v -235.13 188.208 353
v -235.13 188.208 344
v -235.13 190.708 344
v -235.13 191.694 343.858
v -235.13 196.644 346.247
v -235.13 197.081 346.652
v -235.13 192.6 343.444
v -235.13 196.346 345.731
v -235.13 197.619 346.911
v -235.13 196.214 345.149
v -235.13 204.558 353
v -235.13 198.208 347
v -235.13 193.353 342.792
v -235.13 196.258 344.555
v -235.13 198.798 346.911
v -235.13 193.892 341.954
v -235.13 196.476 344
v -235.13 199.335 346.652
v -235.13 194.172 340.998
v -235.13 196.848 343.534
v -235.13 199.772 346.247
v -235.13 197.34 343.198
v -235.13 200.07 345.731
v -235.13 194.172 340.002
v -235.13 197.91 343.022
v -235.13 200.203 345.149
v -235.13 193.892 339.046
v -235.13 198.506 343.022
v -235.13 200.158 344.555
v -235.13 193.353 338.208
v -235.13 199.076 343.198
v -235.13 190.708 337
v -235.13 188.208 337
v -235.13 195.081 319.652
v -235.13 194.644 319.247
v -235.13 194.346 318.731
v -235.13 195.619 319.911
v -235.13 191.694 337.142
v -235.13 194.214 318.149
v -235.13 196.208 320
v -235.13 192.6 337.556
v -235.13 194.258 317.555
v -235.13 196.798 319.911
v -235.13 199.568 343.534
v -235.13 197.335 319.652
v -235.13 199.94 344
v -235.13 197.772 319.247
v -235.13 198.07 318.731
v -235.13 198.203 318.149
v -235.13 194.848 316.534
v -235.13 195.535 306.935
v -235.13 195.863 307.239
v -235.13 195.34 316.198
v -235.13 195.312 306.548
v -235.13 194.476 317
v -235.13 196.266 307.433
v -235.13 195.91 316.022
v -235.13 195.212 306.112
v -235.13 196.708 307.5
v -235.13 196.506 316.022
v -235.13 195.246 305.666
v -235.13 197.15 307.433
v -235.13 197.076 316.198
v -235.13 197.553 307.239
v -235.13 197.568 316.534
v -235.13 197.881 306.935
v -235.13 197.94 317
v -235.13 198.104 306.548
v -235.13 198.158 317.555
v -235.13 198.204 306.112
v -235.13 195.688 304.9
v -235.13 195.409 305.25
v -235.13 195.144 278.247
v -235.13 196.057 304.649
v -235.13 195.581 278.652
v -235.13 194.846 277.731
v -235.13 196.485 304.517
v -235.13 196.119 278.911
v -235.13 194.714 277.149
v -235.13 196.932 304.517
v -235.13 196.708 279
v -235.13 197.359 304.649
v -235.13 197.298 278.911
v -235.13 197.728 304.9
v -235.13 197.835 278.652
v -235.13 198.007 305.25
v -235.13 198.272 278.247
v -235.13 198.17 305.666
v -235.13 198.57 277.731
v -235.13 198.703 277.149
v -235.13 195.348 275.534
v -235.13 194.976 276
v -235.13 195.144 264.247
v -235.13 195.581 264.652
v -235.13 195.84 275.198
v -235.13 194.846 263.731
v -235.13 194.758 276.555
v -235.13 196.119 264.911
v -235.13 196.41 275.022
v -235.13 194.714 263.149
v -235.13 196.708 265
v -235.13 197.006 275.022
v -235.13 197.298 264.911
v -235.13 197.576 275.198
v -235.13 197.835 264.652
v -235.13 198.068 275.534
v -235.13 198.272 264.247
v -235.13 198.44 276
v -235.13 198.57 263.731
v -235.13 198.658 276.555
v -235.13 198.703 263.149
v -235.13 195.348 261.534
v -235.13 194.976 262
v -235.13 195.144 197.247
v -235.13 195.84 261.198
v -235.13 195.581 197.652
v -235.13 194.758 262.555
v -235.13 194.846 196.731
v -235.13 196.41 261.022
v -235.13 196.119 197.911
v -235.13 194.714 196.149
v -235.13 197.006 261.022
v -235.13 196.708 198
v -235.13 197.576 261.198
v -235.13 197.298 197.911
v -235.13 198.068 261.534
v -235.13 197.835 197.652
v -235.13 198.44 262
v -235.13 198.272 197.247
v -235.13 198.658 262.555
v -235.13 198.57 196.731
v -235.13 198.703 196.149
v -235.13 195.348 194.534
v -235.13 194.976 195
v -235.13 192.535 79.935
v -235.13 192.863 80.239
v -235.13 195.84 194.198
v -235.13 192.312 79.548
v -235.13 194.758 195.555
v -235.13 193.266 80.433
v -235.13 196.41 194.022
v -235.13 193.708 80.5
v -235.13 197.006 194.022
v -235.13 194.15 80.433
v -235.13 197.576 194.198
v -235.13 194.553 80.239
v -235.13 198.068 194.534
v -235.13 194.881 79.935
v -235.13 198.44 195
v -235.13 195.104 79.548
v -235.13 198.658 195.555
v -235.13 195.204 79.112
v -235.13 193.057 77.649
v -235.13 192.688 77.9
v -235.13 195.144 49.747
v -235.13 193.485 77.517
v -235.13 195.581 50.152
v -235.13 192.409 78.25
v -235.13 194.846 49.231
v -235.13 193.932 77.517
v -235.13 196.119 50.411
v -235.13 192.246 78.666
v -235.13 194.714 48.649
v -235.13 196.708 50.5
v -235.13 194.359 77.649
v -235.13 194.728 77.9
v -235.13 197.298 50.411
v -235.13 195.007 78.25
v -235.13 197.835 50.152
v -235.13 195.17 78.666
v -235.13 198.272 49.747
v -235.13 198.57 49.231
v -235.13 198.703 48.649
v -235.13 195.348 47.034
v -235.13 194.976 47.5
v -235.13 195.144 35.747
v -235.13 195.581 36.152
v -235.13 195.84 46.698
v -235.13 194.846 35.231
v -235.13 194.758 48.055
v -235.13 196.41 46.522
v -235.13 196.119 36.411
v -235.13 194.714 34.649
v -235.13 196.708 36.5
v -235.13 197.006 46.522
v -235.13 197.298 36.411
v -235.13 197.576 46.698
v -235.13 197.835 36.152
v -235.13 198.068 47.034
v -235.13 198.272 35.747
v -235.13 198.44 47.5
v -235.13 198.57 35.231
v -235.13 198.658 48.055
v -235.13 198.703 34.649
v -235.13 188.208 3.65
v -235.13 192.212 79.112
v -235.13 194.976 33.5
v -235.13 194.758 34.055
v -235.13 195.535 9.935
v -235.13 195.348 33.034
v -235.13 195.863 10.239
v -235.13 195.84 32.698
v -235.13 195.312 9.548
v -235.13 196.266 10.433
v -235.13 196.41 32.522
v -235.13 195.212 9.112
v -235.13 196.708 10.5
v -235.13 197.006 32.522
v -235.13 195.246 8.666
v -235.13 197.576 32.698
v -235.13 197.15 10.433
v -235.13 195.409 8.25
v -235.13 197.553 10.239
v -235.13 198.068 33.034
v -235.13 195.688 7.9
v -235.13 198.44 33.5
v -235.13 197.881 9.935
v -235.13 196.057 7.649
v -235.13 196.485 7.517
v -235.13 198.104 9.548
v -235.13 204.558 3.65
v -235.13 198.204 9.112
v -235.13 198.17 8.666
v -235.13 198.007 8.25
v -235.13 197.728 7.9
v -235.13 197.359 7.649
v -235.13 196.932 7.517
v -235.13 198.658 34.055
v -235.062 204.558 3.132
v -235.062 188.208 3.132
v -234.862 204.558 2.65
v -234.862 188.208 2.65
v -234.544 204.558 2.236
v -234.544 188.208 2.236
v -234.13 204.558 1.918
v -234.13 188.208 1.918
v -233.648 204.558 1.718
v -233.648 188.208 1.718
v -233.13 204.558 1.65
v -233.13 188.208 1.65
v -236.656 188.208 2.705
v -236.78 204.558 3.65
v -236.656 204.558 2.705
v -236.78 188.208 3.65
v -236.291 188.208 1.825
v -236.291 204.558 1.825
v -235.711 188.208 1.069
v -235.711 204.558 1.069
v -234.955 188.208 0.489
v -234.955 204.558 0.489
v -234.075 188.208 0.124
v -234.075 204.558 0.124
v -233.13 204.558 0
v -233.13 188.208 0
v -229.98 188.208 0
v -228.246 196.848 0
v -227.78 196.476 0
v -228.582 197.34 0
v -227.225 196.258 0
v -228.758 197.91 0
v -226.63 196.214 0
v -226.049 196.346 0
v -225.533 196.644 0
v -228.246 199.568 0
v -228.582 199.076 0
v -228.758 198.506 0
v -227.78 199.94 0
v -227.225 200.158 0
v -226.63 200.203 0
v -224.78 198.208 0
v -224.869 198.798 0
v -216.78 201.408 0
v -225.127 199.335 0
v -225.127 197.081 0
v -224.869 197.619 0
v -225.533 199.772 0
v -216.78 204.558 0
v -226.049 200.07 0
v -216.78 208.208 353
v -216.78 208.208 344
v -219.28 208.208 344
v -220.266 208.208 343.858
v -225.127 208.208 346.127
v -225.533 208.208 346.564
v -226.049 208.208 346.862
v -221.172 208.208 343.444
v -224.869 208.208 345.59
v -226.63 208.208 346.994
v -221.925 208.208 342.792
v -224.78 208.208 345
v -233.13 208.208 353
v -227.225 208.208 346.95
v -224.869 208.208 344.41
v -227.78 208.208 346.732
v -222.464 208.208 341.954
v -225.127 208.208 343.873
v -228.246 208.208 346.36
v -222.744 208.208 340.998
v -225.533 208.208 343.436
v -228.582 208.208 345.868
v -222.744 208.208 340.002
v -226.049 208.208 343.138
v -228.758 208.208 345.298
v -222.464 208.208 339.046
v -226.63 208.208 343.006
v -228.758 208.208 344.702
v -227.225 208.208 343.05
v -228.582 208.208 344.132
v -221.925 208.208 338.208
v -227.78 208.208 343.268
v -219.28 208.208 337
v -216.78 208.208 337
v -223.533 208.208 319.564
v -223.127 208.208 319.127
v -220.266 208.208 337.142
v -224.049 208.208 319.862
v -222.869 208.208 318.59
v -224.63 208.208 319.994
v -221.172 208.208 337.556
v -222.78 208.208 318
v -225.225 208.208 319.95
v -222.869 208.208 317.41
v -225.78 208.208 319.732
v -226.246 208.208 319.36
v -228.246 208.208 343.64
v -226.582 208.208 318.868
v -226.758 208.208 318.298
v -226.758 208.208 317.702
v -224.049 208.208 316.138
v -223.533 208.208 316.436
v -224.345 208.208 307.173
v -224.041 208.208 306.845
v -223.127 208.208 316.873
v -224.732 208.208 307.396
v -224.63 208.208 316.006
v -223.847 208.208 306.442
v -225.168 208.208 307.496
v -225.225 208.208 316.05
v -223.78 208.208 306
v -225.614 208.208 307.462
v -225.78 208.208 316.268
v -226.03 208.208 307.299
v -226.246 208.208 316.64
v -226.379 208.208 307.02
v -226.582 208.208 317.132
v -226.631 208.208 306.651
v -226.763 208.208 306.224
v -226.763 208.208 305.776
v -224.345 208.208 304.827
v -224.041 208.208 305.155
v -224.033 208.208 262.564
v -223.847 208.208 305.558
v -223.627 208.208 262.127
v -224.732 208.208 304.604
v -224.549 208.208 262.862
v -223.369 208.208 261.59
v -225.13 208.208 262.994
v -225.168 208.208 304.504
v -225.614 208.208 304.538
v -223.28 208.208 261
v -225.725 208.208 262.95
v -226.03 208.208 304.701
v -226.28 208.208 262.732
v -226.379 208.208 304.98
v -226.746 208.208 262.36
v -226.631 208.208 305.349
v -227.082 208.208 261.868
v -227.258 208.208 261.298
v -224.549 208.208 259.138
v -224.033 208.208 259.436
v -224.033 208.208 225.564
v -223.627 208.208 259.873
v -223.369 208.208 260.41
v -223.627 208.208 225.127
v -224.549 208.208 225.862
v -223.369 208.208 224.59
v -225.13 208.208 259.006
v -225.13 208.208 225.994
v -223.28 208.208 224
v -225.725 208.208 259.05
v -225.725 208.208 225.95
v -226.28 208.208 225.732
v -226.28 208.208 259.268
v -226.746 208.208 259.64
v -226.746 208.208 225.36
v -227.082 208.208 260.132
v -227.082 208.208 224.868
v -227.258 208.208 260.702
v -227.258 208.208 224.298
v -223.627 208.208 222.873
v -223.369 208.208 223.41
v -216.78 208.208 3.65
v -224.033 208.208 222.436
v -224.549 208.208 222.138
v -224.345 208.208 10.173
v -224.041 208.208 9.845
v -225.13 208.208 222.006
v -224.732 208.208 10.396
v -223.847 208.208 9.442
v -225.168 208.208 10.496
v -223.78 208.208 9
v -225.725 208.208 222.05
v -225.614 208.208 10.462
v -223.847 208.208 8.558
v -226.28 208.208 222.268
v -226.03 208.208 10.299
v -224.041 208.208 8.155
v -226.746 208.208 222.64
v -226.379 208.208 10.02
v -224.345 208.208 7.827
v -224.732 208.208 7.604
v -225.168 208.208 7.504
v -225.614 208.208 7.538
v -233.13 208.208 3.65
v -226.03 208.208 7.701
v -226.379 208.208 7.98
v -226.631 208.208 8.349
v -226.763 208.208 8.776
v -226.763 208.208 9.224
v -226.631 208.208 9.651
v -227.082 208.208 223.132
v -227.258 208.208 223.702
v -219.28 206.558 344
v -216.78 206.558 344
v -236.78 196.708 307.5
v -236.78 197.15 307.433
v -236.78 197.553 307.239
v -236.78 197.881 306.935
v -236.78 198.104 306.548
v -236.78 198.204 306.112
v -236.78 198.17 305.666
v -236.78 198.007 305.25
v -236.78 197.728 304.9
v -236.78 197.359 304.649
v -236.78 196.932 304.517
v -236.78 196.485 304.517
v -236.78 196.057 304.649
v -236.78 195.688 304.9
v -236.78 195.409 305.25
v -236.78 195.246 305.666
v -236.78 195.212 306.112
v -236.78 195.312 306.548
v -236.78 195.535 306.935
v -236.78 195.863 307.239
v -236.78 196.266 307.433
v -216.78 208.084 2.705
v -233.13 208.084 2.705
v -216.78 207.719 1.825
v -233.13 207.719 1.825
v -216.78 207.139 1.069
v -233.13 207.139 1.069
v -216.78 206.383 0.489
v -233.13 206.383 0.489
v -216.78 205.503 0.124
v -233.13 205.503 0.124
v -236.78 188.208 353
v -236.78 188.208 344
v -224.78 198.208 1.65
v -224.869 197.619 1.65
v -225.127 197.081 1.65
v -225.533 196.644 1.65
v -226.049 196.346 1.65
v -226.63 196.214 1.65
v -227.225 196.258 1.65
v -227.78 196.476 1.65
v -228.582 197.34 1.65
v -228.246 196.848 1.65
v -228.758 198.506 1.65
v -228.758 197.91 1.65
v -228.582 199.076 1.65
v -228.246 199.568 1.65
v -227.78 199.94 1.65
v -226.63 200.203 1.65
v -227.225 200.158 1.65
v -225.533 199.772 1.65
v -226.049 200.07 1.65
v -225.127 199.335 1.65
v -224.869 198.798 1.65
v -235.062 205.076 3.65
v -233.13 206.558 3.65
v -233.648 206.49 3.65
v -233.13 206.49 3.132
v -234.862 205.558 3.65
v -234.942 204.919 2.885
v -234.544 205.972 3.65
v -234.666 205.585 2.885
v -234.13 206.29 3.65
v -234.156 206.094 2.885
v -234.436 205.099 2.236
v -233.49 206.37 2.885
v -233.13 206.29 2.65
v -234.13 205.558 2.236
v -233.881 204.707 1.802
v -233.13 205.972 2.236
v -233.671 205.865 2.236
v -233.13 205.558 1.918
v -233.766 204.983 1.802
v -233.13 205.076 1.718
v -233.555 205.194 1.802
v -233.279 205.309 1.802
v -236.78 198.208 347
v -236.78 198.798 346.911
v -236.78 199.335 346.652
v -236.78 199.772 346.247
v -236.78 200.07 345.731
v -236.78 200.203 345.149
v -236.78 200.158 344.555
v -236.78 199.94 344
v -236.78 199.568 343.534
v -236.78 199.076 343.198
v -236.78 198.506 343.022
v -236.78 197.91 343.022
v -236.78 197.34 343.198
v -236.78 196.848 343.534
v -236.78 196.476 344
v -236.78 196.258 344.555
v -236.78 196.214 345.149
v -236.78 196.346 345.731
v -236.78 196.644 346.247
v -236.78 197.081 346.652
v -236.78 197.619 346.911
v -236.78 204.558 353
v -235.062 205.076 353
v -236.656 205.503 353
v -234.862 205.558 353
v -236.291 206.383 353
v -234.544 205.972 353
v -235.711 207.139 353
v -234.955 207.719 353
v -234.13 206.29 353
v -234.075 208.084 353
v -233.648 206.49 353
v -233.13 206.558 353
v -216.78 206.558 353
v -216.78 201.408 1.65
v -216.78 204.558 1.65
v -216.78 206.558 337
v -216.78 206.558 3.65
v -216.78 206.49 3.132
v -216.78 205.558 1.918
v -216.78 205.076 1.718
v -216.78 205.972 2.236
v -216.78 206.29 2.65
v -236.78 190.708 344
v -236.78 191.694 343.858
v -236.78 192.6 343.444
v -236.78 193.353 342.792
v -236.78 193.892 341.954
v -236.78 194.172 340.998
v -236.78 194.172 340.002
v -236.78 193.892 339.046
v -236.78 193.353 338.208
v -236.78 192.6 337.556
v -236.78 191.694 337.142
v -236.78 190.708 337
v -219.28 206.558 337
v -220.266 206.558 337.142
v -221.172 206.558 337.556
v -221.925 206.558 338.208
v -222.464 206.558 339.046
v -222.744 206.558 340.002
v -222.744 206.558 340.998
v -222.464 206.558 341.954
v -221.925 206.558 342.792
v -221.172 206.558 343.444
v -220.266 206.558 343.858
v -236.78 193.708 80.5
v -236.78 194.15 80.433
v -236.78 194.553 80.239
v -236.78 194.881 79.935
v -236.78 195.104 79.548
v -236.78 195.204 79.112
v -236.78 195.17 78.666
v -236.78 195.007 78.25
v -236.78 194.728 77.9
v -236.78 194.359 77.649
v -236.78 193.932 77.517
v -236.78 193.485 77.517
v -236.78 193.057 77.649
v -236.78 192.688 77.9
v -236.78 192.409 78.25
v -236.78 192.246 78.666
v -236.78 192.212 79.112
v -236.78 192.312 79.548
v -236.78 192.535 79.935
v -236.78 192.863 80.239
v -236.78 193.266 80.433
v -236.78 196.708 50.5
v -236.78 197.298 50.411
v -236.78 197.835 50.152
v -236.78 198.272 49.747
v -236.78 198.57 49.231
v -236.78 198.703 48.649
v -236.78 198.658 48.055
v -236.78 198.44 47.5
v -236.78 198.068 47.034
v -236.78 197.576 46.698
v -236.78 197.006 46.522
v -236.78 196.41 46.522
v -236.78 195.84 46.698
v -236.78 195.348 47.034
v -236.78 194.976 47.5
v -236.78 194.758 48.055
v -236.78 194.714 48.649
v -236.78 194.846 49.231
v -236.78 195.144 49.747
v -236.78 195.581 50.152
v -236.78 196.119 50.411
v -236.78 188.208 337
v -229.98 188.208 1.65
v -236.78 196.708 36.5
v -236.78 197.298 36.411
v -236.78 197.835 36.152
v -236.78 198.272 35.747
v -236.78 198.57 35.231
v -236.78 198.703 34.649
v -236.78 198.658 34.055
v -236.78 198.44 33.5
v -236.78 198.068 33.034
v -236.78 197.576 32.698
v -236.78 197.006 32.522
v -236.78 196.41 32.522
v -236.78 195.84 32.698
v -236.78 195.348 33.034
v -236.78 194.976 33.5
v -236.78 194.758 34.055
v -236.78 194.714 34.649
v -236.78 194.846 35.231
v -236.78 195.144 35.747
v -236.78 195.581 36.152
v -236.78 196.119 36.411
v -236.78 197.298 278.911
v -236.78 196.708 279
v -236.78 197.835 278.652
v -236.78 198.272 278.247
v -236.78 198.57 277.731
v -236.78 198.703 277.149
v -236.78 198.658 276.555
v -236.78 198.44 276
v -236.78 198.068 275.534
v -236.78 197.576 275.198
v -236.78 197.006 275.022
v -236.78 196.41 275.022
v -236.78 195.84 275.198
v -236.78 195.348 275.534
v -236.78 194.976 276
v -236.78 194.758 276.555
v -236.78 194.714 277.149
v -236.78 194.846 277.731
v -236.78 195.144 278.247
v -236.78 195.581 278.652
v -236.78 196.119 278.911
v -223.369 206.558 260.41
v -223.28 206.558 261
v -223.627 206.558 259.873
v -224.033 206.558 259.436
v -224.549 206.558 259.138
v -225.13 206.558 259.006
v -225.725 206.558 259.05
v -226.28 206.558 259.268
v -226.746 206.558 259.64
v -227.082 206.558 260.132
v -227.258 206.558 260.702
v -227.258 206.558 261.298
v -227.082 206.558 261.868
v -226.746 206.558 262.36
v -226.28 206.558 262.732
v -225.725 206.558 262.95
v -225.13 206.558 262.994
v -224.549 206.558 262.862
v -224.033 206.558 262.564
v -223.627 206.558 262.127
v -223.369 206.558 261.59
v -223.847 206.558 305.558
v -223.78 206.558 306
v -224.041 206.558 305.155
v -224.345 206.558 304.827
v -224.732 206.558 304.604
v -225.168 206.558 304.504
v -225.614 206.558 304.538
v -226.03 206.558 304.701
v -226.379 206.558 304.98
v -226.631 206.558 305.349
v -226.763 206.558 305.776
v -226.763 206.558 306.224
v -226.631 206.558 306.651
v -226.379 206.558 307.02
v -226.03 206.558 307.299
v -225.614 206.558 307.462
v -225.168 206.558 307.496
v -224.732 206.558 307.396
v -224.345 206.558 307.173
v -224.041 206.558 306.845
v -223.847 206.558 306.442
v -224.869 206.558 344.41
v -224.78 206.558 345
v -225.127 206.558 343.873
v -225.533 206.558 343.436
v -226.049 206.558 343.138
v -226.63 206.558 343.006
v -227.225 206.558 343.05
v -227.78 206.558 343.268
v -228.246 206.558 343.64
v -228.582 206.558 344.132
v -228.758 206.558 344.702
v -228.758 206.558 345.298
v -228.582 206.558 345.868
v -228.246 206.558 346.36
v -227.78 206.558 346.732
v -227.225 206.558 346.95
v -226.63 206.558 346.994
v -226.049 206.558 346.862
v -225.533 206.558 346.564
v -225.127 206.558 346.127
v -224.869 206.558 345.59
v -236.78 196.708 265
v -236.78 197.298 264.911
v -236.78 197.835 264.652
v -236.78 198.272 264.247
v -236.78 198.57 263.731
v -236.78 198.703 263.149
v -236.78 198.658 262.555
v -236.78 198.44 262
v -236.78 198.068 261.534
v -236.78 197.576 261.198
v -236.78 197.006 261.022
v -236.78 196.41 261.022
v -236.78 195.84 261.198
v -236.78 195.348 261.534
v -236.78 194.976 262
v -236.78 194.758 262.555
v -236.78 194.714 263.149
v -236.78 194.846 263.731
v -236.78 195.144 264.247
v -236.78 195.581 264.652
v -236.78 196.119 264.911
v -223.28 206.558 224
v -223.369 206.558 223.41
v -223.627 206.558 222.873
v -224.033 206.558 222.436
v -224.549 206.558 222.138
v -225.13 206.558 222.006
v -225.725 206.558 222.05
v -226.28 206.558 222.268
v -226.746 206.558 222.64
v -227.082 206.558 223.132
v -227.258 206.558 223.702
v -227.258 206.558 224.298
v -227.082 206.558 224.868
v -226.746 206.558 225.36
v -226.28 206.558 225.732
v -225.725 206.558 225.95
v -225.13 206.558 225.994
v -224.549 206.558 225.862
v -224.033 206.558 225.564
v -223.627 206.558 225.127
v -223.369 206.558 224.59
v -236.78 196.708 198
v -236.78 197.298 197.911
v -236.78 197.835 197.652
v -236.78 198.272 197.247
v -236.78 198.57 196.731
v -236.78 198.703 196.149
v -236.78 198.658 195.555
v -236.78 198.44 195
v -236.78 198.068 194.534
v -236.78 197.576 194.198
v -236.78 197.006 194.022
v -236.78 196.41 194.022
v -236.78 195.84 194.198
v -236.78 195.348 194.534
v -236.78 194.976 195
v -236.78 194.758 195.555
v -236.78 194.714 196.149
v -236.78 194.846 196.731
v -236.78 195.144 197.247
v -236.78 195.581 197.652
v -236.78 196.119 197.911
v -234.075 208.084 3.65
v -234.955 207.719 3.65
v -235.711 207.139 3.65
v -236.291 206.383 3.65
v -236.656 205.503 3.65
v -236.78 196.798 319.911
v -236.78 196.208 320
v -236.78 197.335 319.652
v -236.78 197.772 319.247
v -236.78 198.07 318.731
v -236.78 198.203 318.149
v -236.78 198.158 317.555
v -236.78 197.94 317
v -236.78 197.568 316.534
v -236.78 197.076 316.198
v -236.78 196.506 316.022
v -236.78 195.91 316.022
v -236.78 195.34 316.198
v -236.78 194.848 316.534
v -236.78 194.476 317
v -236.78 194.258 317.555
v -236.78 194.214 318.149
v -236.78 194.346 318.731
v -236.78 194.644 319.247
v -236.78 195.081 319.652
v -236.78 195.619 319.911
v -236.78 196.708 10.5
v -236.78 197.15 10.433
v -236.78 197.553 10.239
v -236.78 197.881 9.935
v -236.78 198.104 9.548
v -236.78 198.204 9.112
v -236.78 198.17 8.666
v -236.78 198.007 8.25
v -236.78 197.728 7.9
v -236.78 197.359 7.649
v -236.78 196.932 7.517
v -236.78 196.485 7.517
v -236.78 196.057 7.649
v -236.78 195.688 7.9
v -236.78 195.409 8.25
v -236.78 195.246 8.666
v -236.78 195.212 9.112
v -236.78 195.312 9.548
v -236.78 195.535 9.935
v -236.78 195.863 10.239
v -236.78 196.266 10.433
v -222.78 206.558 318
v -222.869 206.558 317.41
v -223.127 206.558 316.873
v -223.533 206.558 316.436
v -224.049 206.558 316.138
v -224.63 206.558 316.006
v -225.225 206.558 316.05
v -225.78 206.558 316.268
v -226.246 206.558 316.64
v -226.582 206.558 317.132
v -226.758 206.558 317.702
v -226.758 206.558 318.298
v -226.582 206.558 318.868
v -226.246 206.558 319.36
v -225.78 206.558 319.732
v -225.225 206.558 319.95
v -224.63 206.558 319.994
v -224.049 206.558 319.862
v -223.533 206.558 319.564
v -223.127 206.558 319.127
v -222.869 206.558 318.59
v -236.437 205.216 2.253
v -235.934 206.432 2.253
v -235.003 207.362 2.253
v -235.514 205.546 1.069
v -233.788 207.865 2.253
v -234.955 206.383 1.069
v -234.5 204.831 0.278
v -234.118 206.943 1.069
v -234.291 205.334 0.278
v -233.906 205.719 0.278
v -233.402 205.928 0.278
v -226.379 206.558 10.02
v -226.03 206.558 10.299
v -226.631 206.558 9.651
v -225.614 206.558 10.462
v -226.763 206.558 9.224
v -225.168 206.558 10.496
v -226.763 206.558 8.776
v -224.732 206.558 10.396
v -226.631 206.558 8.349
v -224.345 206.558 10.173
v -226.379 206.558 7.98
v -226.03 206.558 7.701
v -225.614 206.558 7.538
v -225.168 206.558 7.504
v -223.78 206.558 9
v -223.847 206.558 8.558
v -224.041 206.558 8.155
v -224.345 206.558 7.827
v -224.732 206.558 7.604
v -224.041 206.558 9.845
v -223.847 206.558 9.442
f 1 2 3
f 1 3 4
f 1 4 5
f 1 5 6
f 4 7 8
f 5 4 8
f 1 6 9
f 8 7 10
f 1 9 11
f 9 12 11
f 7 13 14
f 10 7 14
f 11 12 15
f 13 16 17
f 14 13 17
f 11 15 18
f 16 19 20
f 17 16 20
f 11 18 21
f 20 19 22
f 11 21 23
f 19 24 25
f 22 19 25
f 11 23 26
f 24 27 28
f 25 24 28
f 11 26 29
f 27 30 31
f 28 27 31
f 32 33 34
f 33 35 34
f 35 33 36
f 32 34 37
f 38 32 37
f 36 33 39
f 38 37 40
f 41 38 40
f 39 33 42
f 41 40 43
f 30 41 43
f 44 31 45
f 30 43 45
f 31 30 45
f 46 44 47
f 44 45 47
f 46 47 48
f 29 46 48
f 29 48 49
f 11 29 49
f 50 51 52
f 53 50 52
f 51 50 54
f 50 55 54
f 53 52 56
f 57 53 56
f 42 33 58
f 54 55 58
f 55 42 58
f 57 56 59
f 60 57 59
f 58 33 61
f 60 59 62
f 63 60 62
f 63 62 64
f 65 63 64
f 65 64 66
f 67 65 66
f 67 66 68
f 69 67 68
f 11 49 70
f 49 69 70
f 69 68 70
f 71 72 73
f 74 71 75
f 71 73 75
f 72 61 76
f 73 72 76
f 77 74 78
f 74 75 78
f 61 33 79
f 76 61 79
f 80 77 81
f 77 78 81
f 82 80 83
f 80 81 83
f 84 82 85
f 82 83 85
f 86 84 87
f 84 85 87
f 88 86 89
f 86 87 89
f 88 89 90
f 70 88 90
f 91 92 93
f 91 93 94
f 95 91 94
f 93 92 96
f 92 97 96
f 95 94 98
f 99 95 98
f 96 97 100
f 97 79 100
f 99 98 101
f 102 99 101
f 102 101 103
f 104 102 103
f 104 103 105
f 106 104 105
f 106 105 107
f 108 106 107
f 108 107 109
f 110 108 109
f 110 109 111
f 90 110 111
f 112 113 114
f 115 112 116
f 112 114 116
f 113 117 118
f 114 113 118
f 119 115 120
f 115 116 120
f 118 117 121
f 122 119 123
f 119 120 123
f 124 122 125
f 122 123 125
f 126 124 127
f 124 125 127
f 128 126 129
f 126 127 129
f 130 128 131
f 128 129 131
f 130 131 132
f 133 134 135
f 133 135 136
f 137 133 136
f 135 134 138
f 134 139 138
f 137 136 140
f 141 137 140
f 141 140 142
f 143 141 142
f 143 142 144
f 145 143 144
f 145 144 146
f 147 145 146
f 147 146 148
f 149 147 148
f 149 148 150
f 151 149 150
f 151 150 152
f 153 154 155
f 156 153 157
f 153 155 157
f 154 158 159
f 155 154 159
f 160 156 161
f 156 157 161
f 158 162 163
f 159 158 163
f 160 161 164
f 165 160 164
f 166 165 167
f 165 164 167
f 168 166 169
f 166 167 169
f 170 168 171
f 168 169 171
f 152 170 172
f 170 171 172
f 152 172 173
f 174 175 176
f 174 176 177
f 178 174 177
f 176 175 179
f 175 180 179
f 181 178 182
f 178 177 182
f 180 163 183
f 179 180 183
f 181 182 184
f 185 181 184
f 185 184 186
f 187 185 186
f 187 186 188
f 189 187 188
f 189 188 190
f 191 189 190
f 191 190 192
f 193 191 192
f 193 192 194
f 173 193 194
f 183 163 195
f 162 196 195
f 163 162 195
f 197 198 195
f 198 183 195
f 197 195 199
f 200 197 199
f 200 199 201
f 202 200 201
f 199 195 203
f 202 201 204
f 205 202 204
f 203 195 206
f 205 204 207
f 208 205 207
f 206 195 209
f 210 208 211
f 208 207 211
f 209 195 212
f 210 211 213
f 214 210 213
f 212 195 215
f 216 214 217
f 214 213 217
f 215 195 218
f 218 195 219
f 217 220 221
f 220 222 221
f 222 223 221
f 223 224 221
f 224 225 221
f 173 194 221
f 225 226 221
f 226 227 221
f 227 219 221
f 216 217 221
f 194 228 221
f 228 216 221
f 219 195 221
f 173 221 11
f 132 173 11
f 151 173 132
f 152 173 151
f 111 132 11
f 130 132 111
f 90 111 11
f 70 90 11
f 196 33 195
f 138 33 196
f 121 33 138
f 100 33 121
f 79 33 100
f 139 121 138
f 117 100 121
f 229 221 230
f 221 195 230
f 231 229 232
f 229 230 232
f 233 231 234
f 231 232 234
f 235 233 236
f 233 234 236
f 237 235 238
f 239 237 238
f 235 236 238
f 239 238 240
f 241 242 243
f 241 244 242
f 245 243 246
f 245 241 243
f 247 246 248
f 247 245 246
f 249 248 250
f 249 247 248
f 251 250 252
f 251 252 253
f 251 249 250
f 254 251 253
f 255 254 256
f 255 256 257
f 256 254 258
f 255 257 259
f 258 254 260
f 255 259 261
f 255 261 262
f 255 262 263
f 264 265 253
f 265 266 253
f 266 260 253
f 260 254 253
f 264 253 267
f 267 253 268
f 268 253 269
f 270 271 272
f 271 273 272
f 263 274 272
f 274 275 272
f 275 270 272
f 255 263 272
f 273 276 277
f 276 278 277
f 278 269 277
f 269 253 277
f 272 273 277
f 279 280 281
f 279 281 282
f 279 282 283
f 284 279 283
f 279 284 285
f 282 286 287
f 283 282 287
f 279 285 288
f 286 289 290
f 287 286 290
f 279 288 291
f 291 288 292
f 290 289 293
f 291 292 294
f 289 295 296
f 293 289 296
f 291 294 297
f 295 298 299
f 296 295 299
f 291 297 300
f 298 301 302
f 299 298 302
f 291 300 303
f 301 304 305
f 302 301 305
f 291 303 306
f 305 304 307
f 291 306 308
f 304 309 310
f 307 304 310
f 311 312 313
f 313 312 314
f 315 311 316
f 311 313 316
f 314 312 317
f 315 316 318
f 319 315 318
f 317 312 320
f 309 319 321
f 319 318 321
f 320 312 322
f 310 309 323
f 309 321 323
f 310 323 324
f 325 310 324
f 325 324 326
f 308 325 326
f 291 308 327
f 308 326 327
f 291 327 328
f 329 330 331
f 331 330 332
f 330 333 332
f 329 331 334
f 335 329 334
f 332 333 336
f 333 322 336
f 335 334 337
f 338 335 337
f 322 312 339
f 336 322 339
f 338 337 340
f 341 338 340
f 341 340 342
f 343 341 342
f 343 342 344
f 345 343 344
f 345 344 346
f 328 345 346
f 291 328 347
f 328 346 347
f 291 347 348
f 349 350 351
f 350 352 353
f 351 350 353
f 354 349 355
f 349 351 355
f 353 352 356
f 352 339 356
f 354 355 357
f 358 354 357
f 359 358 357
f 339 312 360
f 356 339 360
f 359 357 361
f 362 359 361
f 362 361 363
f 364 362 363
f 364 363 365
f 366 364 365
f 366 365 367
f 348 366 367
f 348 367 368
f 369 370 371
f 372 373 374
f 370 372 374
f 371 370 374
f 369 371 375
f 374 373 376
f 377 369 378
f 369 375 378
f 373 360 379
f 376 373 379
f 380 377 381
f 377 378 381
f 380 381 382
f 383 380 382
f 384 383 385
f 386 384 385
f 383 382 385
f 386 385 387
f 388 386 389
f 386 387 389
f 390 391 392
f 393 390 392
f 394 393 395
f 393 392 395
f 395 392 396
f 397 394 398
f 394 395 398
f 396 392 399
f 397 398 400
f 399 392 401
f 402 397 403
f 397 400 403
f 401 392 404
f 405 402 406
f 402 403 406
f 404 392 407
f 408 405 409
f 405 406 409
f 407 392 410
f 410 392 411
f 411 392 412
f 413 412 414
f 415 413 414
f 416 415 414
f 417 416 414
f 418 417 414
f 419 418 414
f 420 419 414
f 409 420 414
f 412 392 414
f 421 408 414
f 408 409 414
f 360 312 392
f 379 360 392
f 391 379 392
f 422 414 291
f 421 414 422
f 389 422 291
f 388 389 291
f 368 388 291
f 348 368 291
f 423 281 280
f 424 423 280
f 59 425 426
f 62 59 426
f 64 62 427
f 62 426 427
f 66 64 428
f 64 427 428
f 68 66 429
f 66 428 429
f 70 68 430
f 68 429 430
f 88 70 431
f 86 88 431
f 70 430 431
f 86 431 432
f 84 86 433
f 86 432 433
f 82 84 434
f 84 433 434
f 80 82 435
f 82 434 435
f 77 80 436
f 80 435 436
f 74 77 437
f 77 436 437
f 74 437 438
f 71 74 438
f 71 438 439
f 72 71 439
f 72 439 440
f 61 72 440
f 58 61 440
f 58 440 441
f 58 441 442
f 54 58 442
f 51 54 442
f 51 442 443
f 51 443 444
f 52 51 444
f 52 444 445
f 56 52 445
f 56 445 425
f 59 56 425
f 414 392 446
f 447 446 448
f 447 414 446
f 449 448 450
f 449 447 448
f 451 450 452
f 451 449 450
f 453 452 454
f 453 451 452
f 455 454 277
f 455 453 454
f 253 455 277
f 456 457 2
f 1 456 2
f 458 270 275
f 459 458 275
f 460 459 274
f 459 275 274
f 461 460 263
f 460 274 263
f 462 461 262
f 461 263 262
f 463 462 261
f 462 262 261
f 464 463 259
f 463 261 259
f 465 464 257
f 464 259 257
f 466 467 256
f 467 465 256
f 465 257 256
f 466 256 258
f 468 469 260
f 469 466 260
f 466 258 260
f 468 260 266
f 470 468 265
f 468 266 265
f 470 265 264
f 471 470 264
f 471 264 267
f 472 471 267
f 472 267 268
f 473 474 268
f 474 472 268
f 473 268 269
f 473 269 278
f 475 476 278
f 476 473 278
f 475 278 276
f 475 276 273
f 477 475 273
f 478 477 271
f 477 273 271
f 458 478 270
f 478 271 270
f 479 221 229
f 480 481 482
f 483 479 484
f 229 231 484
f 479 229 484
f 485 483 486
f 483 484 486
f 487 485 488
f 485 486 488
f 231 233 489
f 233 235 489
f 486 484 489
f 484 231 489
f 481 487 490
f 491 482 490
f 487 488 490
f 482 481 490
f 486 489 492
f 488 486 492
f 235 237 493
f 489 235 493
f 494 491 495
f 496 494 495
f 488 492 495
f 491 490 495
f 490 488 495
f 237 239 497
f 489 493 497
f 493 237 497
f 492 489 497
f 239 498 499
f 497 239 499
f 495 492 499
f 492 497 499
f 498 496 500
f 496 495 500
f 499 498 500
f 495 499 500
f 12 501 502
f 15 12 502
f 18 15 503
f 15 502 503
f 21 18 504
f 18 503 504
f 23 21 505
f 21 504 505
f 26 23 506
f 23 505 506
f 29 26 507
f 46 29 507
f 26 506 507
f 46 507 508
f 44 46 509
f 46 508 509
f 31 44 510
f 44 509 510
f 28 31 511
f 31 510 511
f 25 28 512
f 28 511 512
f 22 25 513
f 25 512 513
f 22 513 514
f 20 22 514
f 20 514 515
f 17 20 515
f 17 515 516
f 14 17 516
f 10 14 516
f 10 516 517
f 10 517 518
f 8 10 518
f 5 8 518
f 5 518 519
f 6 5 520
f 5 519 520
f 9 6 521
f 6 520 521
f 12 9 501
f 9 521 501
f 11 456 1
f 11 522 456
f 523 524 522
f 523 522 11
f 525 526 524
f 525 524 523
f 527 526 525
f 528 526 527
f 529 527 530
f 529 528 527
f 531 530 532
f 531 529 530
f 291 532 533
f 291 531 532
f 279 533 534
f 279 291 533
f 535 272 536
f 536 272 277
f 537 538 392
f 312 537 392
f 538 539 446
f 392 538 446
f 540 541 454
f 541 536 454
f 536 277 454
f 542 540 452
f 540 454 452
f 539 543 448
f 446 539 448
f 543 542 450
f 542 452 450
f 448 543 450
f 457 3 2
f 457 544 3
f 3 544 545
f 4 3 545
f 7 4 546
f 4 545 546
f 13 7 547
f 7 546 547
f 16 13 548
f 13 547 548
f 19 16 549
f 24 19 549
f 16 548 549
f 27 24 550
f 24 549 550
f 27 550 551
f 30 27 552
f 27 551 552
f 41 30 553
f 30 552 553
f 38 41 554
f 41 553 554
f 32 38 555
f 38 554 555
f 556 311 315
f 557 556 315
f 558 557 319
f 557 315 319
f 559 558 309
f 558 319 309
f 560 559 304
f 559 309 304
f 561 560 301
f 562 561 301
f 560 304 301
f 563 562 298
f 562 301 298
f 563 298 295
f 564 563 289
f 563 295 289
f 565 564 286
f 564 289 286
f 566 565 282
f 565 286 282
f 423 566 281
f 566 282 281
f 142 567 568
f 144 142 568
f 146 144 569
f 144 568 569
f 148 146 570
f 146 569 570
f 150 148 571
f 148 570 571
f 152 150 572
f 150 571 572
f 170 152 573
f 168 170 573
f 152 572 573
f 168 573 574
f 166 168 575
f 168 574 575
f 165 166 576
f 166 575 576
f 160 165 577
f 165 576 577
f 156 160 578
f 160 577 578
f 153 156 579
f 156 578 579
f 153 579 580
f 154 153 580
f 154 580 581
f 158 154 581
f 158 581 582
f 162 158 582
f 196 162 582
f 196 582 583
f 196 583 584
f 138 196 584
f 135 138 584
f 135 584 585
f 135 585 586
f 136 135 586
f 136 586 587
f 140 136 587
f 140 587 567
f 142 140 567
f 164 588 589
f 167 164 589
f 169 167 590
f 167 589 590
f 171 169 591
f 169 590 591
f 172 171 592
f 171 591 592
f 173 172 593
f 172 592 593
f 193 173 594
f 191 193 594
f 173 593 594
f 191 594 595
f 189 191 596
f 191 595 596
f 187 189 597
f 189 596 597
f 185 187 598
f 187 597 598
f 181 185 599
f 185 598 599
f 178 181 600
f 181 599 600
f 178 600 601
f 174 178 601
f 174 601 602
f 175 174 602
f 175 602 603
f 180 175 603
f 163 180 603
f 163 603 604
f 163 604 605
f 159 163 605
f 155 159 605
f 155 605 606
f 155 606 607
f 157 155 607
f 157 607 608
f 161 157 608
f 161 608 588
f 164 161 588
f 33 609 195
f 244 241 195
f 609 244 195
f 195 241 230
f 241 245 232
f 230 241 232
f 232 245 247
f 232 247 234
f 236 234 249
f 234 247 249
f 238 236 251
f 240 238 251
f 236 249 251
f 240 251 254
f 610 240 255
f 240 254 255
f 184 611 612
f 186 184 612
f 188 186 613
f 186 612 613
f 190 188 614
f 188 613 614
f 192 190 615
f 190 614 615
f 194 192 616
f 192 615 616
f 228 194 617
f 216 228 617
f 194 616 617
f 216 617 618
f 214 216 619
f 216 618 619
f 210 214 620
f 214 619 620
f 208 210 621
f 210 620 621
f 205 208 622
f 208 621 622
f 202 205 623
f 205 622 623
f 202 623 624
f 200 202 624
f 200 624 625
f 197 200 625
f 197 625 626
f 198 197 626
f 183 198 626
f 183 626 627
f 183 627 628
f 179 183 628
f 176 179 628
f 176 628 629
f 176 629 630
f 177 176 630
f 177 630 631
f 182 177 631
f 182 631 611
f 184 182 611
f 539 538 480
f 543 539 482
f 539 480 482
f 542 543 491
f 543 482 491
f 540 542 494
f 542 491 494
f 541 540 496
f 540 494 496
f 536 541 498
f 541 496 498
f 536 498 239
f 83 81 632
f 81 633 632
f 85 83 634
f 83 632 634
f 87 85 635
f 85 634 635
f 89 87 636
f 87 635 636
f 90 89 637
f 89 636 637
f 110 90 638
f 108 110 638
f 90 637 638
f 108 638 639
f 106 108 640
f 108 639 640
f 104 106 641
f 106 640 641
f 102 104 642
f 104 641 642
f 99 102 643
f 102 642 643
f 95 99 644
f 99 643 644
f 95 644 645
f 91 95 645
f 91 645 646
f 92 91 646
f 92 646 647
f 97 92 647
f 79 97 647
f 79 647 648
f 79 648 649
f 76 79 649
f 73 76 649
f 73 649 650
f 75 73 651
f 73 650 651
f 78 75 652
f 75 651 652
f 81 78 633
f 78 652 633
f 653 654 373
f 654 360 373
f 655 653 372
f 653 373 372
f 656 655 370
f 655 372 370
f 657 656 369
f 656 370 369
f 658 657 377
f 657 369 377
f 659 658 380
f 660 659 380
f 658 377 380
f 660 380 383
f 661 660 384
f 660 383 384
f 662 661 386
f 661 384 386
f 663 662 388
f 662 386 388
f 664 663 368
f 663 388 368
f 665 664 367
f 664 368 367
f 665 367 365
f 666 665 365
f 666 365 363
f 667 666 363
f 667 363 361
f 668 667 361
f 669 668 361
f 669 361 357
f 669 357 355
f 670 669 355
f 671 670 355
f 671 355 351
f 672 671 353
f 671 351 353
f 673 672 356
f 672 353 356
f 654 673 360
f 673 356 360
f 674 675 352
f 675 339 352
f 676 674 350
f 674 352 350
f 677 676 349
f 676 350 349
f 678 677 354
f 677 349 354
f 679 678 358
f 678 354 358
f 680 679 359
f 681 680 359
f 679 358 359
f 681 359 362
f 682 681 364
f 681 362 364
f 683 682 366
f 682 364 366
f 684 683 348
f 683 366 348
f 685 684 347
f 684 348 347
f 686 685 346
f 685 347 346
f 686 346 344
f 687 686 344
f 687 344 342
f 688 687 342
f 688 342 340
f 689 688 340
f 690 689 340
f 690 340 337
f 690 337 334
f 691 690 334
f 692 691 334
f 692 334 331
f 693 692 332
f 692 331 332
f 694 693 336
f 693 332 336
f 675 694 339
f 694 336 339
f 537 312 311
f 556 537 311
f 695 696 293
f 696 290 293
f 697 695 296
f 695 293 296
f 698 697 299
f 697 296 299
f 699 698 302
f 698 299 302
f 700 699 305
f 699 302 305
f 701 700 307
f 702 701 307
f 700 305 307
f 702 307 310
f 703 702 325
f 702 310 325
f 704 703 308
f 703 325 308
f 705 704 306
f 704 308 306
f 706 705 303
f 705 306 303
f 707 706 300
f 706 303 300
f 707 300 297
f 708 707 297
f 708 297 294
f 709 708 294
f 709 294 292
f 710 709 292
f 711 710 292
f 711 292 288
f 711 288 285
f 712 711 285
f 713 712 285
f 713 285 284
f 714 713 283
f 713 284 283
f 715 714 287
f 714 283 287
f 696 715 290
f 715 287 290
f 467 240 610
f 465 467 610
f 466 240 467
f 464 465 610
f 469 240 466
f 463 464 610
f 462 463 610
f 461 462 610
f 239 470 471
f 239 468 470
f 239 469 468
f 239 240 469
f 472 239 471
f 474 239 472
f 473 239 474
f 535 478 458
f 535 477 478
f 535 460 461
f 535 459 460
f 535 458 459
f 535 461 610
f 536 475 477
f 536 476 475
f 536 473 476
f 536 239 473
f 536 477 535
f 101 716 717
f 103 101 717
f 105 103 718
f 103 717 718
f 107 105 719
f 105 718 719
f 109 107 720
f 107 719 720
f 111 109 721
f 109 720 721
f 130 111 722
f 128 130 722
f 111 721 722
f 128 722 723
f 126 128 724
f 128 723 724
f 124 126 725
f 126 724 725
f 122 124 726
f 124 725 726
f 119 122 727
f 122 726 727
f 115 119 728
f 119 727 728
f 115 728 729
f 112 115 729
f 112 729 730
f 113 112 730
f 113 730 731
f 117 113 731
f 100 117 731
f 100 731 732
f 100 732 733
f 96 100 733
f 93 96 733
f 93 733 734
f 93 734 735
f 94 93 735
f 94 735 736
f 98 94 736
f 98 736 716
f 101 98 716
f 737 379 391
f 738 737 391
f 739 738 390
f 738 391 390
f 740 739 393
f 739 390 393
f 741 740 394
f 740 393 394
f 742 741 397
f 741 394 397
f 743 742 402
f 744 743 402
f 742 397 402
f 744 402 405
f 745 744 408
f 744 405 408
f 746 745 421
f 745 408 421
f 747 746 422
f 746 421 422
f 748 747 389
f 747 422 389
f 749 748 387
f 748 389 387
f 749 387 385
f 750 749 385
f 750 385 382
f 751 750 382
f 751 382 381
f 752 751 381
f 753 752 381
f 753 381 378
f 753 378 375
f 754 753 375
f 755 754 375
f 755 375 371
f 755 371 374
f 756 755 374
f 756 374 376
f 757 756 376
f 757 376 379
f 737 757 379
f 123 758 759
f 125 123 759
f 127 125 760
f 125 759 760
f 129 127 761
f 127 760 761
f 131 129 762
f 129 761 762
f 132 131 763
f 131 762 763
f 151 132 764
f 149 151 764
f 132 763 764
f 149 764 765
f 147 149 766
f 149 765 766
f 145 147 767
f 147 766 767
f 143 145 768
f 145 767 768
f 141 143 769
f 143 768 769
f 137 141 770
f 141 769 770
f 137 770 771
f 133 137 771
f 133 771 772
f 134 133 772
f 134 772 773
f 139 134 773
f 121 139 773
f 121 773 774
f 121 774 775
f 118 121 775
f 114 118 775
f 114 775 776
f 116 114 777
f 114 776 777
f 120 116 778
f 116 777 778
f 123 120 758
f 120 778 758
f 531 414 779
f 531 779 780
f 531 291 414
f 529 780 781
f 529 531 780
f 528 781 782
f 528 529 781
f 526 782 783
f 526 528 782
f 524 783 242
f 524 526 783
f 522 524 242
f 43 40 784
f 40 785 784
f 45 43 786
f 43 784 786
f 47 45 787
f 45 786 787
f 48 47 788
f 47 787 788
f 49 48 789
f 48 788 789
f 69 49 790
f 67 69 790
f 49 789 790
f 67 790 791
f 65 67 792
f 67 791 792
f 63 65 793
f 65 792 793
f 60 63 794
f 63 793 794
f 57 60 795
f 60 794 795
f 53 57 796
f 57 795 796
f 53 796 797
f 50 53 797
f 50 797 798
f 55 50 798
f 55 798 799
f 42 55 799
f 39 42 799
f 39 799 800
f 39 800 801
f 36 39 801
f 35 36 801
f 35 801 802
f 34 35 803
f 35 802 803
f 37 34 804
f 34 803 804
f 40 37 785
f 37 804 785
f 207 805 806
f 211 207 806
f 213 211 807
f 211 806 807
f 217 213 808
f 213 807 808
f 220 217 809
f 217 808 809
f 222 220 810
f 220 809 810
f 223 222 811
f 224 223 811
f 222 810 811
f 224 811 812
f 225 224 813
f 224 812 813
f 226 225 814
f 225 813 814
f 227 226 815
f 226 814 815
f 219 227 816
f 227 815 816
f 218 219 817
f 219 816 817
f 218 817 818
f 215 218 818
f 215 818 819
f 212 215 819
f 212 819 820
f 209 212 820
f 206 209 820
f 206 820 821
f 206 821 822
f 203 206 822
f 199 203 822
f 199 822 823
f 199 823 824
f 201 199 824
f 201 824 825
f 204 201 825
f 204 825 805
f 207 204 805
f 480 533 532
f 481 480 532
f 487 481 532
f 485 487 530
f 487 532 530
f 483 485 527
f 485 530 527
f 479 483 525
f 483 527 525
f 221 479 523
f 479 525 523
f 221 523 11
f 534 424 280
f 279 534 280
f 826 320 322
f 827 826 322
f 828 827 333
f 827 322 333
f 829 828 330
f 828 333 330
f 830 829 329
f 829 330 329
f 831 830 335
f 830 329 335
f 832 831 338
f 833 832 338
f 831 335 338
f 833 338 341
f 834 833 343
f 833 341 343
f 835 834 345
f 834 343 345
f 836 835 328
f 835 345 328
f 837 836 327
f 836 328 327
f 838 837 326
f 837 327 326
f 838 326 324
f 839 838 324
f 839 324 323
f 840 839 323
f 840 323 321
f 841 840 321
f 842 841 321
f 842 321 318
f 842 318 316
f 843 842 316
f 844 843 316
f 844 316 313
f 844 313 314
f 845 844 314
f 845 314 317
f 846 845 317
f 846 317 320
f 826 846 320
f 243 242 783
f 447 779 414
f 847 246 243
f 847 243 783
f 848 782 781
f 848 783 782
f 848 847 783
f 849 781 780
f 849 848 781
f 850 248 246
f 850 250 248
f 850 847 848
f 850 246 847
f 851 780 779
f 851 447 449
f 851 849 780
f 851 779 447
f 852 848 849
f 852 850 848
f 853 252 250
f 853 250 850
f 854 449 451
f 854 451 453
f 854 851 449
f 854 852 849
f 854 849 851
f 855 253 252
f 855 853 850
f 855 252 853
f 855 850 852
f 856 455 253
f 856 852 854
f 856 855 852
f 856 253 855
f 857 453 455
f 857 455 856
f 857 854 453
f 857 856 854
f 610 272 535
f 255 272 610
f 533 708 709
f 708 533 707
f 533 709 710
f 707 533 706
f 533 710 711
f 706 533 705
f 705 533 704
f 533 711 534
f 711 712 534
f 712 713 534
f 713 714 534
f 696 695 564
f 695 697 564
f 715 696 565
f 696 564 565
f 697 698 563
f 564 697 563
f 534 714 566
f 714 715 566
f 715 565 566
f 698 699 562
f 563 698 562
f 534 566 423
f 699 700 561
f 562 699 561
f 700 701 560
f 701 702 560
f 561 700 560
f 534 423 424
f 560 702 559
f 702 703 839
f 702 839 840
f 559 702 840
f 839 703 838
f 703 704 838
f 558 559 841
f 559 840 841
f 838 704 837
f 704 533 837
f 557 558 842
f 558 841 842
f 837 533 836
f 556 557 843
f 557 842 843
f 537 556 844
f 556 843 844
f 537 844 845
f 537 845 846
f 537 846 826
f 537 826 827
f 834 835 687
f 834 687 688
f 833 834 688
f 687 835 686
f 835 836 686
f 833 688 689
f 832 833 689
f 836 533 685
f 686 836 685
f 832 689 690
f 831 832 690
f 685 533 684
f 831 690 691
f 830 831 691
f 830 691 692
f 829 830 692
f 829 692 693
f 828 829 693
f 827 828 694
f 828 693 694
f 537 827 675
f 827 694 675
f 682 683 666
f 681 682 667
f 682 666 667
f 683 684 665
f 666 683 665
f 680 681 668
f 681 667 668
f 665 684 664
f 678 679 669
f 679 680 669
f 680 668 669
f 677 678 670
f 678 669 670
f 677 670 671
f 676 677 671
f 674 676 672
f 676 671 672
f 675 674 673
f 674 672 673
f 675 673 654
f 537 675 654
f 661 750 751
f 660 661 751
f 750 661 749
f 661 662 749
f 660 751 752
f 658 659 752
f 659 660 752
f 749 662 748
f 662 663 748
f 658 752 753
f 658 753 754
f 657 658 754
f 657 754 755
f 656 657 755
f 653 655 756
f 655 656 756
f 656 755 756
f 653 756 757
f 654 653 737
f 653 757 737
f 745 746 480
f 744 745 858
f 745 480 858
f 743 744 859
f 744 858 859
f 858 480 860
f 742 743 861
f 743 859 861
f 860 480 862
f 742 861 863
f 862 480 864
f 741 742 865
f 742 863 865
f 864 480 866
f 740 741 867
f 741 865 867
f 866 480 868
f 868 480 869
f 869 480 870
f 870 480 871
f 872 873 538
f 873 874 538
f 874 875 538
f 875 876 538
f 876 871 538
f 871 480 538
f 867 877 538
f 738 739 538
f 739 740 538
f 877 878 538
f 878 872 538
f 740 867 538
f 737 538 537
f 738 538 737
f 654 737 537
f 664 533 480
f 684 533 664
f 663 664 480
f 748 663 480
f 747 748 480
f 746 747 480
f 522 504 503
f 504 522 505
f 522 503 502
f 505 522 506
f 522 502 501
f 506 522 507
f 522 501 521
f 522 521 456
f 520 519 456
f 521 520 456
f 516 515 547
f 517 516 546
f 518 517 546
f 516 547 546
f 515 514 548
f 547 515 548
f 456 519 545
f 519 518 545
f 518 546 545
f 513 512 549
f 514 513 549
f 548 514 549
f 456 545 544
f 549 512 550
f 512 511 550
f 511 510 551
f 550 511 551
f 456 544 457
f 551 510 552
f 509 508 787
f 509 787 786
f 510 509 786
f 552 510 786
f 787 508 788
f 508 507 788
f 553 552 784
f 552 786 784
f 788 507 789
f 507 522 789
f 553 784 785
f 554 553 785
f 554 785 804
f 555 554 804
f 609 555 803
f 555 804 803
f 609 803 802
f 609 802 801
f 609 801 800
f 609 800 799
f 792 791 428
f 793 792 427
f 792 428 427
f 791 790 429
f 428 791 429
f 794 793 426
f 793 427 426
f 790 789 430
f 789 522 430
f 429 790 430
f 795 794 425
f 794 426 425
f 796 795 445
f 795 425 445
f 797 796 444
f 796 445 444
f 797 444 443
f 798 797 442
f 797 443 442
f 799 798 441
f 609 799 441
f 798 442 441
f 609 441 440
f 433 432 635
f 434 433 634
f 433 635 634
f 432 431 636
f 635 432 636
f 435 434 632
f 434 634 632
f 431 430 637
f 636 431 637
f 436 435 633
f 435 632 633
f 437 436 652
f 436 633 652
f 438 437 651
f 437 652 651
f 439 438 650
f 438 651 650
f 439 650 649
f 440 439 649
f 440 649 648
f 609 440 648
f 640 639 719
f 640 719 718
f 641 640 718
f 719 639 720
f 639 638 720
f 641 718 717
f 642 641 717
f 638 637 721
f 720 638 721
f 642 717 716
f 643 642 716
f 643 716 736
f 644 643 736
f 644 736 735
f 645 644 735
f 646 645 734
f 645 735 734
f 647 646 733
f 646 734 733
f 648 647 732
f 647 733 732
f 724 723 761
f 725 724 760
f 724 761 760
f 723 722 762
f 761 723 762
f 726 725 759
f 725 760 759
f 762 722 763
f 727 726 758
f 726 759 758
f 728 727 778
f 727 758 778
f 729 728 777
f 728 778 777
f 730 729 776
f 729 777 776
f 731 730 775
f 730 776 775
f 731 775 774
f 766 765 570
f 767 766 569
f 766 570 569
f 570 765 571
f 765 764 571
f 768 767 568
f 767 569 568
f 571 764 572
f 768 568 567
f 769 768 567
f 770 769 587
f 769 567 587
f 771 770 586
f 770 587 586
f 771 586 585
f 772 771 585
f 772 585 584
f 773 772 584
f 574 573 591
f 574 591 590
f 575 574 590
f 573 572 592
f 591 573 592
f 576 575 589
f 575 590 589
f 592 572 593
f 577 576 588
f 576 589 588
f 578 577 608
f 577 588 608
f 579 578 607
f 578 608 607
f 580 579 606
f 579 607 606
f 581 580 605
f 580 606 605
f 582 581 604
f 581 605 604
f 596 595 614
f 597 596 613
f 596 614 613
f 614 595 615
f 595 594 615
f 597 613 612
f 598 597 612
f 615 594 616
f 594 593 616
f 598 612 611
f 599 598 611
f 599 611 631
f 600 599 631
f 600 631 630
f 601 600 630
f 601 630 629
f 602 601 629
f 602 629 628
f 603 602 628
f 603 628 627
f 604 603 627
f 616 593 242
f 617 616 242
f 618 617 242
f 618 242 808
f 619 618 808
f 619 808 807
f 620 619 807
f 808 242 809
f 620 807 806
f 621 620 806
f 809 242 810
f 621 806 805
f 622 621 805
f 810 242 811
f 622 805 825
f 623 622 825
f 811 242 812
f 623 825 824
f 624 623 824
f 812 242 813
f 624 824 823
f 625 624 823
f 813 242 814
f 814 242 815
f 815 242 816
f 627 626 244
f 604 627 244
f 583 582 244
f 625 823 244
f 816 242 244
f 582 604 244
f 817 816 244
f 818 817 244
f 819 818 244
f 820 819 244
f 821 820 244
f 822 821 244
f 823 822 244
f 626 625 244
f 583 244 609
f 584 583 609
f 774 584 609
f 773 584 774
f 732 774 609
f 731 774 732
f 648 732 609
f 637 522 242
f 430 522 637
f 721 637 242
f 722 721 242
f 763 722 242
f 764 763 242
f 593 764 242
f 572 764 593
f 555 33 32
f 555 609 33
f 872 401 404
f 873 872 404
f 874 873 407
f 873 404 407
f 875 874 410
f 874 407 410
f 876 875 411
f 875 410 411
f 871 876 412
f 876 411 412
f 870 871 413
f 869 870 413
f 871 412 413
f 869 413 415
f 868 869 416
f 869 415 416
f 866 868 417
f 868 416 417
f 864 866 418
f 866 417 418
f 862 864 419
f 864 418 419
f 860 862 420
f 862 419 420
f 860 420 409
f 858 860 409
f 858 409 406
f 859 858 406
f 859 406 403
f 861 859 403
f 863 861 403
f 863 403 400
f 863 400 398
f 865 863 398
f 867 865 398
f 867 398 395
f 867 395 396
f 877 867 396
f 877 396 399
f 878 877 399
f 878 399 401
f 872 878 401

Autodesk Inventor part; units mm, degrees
ref_plane "YZ Plane" through (0, 0, 0) normal (1, 0, 0) x (0, 1, 0)
ref_plane "XZ Plane" through (0, 0, 0) normal (0, 1, 0) x (-1, 0, 0)
ref_plane "XY Plane" through (0, 0, 0) normal (0, 0, 1) x (1, 0, 0)
sketch "Эскиз1" plane through (0, 0, 0) normal (0, 0, 1) x (1, 0, 0)
  line L0 (-236.7799, 208.2081) -> (-236.7799, 188.2081)
  line L1 (-216.7799, 208.2081) -> (-236.7799, 208.2081)
  line L2 (-236.7799, 188.2081) -> (-235.1299, 188.2081)
  line L3 (-235.1299, 188.2081) -> (-235.1299, 206.5581)
  line L4 (-235.1299, 206.5581) -> (-216.7799, 206.5581)
  line L5 (-216.7799, 206.5581) -> (-216.7799, 208.2081)
  line L6 (-216.7799, 206.5581) -> (-216.7799, 201.4081)
  line L7 (-216.7799, 201.4081) -> (-229.9799, 188.2081)
  line L8 (-229.9799, 188.2081) -> (-235.1299, 188.2081)
  line L9 (-236.7799, 208.2081) -> (-223.3799, 194.8081) construction
  circle A0 centre (-226.7799, 198.2081) radius 2
  point P0 (0, 0)
  dimension "d0" = 20
  dimension "d1" = 20
  dimension "d2" = 1.65
  dimension "d3" = 1.65
  dimension "d6" = 6.8
  dimension "d7" = 6.8
  dimension "d10" = 4
  dimension "d11" = 10
extrude "Выдавливание1" add sketch "Эскиз1" along normal blind 353 contours L1 L5 L4 L3 L2 L0
extrude "Выдавливание2" add sketch "Эскиз1" along normal blind 1.65 contours L3 L4 L6 L7 L8 | A0
extrude "Выдавливание3" cut sketch "Эскиз1" along normal blind 1.65 contours A0
fillet "Сопряжение1" radius 2 1 edges at (-235.1299, 206.5581, 177.325)
fillet "Сопряжение2" radius 3.65 1 edges at (-236.7799, 208.2081, 176.5)
fillet "Сопряжение3" radius 3.65 3 edges at (-235.7109, 207.1391, 0) (-236.7799, 196.3831, 0) (-224.9549, 208.2081, 0)
fillet "Сопряжение4" radius 2 3 edges at (-234.5442, 205.9724, 1.65) (-235.1299, 196.3831, 1.65) (-224.9549, 206.5581, 1.65)
sketch "Эскиз2" plane through (-236.7799, 188.2081, 353) normal (-1, 0, 0) x (0, 0, 1)
  circle A0 centre (-344, 8.5) radius 1.5
  line L0 (-353, 16.35) -> (-353, 0) projected
  line L1 (-349.35, 0) -> (0, 0) projected
  circle A1 centre (-318.5, 8.5) radius 2
  circle A2 centre (-304.5, 8.5) radius 2
  line L2 (-318.5, 8.5) -> (-304.5, 8.5) construction
  circle A3 centre (-274, 5.5) radius 1.5
  circle A4 centre (-157, 8.5) radius 2
  circle A5 centre (-90, 8.5) radius 2
  circle A6 centre (-76, 8.5) radius 2
  line L3 (0, 16.35) -> (0, 0) projected
  circle A7 centre (-47, 8.5) radius 1.5
  circle A8 centre (-35, 8) radius 2
  circle A9 centre (-8, 10) radius 2
  point P0 (-353, -188.2081)
  dimension "d18" = 3
  dimension "d19" = 9
  dimension "d20" = 8.5
  dimension "d21" = 4
  dimension "d22" = 4
  dimension "d23" = 34.5
  dimension "d24" = 8.5
  dimension "d25" = 14
  dimension "d26" = 3
  dimension "d27" = 5.5
  dimension "d28" = 79
  dimension "d29" = 4
  dimension "d30" = 8.5
  dimension "d31" = 196
  dimension "d32" = 4
  dimension "d33" = 4
  dimension "d34" = 8.5
  dimension "d35" = 8.5
  dimension "d36" = 90
  dimension "d37" = 14
  dimension "d38" = 3
  dimension "d39" = 8.5
  dimension "d40" = 47
  dimension "d41" = 4
  dimension "d42" = 4
  dimension "d43" = 8
  dimension "d44" = 10
  dimension "d45" = 8
  dimension "d46" = 27
  dimension "d47" = 12
extrude "Выдавливание4" cut sketch "Эскиз2" against normal blind 1.65
sketch "Эскиз3" plane through (-233.1299, 208.2081, 353) normal (0, 1, 0) x (1, 0, 0)
  circle A0 centre (7.85, 344) radius 1.5
  line L0 (16.35, 353) -> (0, 353) projected
  line L1 (16.35, 349.35) -> (16.35, 0) projected
  circle A1 centre (8.35, 35) radius 2
  circle A2 centre (6.35, 8) radius 2
  line L2 (16.35, 0) -> (0, 0) projected
  circle A3 centre (7.85, 47) radius 1.5
  circle A4 centre (7.85, 129) radius 2
  circle A5 centre (7.85, 92) radius 2
  point P0 (233.1299, 353)
  dimension "d50" = 3
  dimension "d51" = 9
  dimension "d52" = 8.5
  dimension "d53" = 4
  dimension "d54" = 4
  dimension "d55" = 8
  dimension "d56" = 10
  dimension "d57" = 27
  dimension "d58" = 8
  dimension "d59" = 3
  dimension "d60" = 8.5
  dimension "d61" = 12
  dimension "d62" = 4
  dimension "d63" = 4
  dimension "d64" = 8.5
  dimension "d65" = 8.5
  dimension "d66" = 37
  dimension "d67" = 92
extrude "Выдавливание5" cut sketch "Эскиз3" against normal blind 1.65
sketch "Эскиз4" plane through (-233.1299, 208.2081, 353) normal (0, 1, 0) x (1, 0, 0)
  line L0 (13.85, 9) -> (16.35, 9)
  line L1 (16.35, 349.35) -> (16.35, 0) projected
  line L2 (16.35, 9) -> (16.35, 16)
  line L3 (16.35, 16) -> (13.85, 16)
  arc A0 (13.85, 16) -> (13.85, 9) centre (13.85, 12.5) ccw
  line L4 (16.35, 0) -> (0, 0) projected
  point P0 (233.1299, 353)
  dimension "d72" = 3.5
  dimension "d73" = 7
  dimension "d74" = 6
  dimension "d75" = 9
extrude "Выдавливание6" cut sketch "Эскиз4" against normal blind 10
sketch "Эскиз5" plane through (-236.7799, 188.2081, 353) normal (-1, 0, 0) x (0, 0, 1)
  arc A0 (-9, 2.5) -> (-16, 2.5) centre (-12.5, 2.5) ccw
  line L0 (-9, 2.5) -> (-9, 0)
  line L1 (-349.35, 0) -> (0, 0) projected
  line L2 (-9, 0) -> (-16, 0)
  line L3 (-16, 0) -> (-16, 2.5)
  line L4 (0, 16.35) -> (0, 0) projected
  point P0 (-353, -188.2081)
  dimension "d78" = 7
  dimension "d79" = 6
  dimension "d80" = 9
extrude "Выдавливание7" cut sketch "Эскиз5" against normal blind 10
properties part number "стойка"
